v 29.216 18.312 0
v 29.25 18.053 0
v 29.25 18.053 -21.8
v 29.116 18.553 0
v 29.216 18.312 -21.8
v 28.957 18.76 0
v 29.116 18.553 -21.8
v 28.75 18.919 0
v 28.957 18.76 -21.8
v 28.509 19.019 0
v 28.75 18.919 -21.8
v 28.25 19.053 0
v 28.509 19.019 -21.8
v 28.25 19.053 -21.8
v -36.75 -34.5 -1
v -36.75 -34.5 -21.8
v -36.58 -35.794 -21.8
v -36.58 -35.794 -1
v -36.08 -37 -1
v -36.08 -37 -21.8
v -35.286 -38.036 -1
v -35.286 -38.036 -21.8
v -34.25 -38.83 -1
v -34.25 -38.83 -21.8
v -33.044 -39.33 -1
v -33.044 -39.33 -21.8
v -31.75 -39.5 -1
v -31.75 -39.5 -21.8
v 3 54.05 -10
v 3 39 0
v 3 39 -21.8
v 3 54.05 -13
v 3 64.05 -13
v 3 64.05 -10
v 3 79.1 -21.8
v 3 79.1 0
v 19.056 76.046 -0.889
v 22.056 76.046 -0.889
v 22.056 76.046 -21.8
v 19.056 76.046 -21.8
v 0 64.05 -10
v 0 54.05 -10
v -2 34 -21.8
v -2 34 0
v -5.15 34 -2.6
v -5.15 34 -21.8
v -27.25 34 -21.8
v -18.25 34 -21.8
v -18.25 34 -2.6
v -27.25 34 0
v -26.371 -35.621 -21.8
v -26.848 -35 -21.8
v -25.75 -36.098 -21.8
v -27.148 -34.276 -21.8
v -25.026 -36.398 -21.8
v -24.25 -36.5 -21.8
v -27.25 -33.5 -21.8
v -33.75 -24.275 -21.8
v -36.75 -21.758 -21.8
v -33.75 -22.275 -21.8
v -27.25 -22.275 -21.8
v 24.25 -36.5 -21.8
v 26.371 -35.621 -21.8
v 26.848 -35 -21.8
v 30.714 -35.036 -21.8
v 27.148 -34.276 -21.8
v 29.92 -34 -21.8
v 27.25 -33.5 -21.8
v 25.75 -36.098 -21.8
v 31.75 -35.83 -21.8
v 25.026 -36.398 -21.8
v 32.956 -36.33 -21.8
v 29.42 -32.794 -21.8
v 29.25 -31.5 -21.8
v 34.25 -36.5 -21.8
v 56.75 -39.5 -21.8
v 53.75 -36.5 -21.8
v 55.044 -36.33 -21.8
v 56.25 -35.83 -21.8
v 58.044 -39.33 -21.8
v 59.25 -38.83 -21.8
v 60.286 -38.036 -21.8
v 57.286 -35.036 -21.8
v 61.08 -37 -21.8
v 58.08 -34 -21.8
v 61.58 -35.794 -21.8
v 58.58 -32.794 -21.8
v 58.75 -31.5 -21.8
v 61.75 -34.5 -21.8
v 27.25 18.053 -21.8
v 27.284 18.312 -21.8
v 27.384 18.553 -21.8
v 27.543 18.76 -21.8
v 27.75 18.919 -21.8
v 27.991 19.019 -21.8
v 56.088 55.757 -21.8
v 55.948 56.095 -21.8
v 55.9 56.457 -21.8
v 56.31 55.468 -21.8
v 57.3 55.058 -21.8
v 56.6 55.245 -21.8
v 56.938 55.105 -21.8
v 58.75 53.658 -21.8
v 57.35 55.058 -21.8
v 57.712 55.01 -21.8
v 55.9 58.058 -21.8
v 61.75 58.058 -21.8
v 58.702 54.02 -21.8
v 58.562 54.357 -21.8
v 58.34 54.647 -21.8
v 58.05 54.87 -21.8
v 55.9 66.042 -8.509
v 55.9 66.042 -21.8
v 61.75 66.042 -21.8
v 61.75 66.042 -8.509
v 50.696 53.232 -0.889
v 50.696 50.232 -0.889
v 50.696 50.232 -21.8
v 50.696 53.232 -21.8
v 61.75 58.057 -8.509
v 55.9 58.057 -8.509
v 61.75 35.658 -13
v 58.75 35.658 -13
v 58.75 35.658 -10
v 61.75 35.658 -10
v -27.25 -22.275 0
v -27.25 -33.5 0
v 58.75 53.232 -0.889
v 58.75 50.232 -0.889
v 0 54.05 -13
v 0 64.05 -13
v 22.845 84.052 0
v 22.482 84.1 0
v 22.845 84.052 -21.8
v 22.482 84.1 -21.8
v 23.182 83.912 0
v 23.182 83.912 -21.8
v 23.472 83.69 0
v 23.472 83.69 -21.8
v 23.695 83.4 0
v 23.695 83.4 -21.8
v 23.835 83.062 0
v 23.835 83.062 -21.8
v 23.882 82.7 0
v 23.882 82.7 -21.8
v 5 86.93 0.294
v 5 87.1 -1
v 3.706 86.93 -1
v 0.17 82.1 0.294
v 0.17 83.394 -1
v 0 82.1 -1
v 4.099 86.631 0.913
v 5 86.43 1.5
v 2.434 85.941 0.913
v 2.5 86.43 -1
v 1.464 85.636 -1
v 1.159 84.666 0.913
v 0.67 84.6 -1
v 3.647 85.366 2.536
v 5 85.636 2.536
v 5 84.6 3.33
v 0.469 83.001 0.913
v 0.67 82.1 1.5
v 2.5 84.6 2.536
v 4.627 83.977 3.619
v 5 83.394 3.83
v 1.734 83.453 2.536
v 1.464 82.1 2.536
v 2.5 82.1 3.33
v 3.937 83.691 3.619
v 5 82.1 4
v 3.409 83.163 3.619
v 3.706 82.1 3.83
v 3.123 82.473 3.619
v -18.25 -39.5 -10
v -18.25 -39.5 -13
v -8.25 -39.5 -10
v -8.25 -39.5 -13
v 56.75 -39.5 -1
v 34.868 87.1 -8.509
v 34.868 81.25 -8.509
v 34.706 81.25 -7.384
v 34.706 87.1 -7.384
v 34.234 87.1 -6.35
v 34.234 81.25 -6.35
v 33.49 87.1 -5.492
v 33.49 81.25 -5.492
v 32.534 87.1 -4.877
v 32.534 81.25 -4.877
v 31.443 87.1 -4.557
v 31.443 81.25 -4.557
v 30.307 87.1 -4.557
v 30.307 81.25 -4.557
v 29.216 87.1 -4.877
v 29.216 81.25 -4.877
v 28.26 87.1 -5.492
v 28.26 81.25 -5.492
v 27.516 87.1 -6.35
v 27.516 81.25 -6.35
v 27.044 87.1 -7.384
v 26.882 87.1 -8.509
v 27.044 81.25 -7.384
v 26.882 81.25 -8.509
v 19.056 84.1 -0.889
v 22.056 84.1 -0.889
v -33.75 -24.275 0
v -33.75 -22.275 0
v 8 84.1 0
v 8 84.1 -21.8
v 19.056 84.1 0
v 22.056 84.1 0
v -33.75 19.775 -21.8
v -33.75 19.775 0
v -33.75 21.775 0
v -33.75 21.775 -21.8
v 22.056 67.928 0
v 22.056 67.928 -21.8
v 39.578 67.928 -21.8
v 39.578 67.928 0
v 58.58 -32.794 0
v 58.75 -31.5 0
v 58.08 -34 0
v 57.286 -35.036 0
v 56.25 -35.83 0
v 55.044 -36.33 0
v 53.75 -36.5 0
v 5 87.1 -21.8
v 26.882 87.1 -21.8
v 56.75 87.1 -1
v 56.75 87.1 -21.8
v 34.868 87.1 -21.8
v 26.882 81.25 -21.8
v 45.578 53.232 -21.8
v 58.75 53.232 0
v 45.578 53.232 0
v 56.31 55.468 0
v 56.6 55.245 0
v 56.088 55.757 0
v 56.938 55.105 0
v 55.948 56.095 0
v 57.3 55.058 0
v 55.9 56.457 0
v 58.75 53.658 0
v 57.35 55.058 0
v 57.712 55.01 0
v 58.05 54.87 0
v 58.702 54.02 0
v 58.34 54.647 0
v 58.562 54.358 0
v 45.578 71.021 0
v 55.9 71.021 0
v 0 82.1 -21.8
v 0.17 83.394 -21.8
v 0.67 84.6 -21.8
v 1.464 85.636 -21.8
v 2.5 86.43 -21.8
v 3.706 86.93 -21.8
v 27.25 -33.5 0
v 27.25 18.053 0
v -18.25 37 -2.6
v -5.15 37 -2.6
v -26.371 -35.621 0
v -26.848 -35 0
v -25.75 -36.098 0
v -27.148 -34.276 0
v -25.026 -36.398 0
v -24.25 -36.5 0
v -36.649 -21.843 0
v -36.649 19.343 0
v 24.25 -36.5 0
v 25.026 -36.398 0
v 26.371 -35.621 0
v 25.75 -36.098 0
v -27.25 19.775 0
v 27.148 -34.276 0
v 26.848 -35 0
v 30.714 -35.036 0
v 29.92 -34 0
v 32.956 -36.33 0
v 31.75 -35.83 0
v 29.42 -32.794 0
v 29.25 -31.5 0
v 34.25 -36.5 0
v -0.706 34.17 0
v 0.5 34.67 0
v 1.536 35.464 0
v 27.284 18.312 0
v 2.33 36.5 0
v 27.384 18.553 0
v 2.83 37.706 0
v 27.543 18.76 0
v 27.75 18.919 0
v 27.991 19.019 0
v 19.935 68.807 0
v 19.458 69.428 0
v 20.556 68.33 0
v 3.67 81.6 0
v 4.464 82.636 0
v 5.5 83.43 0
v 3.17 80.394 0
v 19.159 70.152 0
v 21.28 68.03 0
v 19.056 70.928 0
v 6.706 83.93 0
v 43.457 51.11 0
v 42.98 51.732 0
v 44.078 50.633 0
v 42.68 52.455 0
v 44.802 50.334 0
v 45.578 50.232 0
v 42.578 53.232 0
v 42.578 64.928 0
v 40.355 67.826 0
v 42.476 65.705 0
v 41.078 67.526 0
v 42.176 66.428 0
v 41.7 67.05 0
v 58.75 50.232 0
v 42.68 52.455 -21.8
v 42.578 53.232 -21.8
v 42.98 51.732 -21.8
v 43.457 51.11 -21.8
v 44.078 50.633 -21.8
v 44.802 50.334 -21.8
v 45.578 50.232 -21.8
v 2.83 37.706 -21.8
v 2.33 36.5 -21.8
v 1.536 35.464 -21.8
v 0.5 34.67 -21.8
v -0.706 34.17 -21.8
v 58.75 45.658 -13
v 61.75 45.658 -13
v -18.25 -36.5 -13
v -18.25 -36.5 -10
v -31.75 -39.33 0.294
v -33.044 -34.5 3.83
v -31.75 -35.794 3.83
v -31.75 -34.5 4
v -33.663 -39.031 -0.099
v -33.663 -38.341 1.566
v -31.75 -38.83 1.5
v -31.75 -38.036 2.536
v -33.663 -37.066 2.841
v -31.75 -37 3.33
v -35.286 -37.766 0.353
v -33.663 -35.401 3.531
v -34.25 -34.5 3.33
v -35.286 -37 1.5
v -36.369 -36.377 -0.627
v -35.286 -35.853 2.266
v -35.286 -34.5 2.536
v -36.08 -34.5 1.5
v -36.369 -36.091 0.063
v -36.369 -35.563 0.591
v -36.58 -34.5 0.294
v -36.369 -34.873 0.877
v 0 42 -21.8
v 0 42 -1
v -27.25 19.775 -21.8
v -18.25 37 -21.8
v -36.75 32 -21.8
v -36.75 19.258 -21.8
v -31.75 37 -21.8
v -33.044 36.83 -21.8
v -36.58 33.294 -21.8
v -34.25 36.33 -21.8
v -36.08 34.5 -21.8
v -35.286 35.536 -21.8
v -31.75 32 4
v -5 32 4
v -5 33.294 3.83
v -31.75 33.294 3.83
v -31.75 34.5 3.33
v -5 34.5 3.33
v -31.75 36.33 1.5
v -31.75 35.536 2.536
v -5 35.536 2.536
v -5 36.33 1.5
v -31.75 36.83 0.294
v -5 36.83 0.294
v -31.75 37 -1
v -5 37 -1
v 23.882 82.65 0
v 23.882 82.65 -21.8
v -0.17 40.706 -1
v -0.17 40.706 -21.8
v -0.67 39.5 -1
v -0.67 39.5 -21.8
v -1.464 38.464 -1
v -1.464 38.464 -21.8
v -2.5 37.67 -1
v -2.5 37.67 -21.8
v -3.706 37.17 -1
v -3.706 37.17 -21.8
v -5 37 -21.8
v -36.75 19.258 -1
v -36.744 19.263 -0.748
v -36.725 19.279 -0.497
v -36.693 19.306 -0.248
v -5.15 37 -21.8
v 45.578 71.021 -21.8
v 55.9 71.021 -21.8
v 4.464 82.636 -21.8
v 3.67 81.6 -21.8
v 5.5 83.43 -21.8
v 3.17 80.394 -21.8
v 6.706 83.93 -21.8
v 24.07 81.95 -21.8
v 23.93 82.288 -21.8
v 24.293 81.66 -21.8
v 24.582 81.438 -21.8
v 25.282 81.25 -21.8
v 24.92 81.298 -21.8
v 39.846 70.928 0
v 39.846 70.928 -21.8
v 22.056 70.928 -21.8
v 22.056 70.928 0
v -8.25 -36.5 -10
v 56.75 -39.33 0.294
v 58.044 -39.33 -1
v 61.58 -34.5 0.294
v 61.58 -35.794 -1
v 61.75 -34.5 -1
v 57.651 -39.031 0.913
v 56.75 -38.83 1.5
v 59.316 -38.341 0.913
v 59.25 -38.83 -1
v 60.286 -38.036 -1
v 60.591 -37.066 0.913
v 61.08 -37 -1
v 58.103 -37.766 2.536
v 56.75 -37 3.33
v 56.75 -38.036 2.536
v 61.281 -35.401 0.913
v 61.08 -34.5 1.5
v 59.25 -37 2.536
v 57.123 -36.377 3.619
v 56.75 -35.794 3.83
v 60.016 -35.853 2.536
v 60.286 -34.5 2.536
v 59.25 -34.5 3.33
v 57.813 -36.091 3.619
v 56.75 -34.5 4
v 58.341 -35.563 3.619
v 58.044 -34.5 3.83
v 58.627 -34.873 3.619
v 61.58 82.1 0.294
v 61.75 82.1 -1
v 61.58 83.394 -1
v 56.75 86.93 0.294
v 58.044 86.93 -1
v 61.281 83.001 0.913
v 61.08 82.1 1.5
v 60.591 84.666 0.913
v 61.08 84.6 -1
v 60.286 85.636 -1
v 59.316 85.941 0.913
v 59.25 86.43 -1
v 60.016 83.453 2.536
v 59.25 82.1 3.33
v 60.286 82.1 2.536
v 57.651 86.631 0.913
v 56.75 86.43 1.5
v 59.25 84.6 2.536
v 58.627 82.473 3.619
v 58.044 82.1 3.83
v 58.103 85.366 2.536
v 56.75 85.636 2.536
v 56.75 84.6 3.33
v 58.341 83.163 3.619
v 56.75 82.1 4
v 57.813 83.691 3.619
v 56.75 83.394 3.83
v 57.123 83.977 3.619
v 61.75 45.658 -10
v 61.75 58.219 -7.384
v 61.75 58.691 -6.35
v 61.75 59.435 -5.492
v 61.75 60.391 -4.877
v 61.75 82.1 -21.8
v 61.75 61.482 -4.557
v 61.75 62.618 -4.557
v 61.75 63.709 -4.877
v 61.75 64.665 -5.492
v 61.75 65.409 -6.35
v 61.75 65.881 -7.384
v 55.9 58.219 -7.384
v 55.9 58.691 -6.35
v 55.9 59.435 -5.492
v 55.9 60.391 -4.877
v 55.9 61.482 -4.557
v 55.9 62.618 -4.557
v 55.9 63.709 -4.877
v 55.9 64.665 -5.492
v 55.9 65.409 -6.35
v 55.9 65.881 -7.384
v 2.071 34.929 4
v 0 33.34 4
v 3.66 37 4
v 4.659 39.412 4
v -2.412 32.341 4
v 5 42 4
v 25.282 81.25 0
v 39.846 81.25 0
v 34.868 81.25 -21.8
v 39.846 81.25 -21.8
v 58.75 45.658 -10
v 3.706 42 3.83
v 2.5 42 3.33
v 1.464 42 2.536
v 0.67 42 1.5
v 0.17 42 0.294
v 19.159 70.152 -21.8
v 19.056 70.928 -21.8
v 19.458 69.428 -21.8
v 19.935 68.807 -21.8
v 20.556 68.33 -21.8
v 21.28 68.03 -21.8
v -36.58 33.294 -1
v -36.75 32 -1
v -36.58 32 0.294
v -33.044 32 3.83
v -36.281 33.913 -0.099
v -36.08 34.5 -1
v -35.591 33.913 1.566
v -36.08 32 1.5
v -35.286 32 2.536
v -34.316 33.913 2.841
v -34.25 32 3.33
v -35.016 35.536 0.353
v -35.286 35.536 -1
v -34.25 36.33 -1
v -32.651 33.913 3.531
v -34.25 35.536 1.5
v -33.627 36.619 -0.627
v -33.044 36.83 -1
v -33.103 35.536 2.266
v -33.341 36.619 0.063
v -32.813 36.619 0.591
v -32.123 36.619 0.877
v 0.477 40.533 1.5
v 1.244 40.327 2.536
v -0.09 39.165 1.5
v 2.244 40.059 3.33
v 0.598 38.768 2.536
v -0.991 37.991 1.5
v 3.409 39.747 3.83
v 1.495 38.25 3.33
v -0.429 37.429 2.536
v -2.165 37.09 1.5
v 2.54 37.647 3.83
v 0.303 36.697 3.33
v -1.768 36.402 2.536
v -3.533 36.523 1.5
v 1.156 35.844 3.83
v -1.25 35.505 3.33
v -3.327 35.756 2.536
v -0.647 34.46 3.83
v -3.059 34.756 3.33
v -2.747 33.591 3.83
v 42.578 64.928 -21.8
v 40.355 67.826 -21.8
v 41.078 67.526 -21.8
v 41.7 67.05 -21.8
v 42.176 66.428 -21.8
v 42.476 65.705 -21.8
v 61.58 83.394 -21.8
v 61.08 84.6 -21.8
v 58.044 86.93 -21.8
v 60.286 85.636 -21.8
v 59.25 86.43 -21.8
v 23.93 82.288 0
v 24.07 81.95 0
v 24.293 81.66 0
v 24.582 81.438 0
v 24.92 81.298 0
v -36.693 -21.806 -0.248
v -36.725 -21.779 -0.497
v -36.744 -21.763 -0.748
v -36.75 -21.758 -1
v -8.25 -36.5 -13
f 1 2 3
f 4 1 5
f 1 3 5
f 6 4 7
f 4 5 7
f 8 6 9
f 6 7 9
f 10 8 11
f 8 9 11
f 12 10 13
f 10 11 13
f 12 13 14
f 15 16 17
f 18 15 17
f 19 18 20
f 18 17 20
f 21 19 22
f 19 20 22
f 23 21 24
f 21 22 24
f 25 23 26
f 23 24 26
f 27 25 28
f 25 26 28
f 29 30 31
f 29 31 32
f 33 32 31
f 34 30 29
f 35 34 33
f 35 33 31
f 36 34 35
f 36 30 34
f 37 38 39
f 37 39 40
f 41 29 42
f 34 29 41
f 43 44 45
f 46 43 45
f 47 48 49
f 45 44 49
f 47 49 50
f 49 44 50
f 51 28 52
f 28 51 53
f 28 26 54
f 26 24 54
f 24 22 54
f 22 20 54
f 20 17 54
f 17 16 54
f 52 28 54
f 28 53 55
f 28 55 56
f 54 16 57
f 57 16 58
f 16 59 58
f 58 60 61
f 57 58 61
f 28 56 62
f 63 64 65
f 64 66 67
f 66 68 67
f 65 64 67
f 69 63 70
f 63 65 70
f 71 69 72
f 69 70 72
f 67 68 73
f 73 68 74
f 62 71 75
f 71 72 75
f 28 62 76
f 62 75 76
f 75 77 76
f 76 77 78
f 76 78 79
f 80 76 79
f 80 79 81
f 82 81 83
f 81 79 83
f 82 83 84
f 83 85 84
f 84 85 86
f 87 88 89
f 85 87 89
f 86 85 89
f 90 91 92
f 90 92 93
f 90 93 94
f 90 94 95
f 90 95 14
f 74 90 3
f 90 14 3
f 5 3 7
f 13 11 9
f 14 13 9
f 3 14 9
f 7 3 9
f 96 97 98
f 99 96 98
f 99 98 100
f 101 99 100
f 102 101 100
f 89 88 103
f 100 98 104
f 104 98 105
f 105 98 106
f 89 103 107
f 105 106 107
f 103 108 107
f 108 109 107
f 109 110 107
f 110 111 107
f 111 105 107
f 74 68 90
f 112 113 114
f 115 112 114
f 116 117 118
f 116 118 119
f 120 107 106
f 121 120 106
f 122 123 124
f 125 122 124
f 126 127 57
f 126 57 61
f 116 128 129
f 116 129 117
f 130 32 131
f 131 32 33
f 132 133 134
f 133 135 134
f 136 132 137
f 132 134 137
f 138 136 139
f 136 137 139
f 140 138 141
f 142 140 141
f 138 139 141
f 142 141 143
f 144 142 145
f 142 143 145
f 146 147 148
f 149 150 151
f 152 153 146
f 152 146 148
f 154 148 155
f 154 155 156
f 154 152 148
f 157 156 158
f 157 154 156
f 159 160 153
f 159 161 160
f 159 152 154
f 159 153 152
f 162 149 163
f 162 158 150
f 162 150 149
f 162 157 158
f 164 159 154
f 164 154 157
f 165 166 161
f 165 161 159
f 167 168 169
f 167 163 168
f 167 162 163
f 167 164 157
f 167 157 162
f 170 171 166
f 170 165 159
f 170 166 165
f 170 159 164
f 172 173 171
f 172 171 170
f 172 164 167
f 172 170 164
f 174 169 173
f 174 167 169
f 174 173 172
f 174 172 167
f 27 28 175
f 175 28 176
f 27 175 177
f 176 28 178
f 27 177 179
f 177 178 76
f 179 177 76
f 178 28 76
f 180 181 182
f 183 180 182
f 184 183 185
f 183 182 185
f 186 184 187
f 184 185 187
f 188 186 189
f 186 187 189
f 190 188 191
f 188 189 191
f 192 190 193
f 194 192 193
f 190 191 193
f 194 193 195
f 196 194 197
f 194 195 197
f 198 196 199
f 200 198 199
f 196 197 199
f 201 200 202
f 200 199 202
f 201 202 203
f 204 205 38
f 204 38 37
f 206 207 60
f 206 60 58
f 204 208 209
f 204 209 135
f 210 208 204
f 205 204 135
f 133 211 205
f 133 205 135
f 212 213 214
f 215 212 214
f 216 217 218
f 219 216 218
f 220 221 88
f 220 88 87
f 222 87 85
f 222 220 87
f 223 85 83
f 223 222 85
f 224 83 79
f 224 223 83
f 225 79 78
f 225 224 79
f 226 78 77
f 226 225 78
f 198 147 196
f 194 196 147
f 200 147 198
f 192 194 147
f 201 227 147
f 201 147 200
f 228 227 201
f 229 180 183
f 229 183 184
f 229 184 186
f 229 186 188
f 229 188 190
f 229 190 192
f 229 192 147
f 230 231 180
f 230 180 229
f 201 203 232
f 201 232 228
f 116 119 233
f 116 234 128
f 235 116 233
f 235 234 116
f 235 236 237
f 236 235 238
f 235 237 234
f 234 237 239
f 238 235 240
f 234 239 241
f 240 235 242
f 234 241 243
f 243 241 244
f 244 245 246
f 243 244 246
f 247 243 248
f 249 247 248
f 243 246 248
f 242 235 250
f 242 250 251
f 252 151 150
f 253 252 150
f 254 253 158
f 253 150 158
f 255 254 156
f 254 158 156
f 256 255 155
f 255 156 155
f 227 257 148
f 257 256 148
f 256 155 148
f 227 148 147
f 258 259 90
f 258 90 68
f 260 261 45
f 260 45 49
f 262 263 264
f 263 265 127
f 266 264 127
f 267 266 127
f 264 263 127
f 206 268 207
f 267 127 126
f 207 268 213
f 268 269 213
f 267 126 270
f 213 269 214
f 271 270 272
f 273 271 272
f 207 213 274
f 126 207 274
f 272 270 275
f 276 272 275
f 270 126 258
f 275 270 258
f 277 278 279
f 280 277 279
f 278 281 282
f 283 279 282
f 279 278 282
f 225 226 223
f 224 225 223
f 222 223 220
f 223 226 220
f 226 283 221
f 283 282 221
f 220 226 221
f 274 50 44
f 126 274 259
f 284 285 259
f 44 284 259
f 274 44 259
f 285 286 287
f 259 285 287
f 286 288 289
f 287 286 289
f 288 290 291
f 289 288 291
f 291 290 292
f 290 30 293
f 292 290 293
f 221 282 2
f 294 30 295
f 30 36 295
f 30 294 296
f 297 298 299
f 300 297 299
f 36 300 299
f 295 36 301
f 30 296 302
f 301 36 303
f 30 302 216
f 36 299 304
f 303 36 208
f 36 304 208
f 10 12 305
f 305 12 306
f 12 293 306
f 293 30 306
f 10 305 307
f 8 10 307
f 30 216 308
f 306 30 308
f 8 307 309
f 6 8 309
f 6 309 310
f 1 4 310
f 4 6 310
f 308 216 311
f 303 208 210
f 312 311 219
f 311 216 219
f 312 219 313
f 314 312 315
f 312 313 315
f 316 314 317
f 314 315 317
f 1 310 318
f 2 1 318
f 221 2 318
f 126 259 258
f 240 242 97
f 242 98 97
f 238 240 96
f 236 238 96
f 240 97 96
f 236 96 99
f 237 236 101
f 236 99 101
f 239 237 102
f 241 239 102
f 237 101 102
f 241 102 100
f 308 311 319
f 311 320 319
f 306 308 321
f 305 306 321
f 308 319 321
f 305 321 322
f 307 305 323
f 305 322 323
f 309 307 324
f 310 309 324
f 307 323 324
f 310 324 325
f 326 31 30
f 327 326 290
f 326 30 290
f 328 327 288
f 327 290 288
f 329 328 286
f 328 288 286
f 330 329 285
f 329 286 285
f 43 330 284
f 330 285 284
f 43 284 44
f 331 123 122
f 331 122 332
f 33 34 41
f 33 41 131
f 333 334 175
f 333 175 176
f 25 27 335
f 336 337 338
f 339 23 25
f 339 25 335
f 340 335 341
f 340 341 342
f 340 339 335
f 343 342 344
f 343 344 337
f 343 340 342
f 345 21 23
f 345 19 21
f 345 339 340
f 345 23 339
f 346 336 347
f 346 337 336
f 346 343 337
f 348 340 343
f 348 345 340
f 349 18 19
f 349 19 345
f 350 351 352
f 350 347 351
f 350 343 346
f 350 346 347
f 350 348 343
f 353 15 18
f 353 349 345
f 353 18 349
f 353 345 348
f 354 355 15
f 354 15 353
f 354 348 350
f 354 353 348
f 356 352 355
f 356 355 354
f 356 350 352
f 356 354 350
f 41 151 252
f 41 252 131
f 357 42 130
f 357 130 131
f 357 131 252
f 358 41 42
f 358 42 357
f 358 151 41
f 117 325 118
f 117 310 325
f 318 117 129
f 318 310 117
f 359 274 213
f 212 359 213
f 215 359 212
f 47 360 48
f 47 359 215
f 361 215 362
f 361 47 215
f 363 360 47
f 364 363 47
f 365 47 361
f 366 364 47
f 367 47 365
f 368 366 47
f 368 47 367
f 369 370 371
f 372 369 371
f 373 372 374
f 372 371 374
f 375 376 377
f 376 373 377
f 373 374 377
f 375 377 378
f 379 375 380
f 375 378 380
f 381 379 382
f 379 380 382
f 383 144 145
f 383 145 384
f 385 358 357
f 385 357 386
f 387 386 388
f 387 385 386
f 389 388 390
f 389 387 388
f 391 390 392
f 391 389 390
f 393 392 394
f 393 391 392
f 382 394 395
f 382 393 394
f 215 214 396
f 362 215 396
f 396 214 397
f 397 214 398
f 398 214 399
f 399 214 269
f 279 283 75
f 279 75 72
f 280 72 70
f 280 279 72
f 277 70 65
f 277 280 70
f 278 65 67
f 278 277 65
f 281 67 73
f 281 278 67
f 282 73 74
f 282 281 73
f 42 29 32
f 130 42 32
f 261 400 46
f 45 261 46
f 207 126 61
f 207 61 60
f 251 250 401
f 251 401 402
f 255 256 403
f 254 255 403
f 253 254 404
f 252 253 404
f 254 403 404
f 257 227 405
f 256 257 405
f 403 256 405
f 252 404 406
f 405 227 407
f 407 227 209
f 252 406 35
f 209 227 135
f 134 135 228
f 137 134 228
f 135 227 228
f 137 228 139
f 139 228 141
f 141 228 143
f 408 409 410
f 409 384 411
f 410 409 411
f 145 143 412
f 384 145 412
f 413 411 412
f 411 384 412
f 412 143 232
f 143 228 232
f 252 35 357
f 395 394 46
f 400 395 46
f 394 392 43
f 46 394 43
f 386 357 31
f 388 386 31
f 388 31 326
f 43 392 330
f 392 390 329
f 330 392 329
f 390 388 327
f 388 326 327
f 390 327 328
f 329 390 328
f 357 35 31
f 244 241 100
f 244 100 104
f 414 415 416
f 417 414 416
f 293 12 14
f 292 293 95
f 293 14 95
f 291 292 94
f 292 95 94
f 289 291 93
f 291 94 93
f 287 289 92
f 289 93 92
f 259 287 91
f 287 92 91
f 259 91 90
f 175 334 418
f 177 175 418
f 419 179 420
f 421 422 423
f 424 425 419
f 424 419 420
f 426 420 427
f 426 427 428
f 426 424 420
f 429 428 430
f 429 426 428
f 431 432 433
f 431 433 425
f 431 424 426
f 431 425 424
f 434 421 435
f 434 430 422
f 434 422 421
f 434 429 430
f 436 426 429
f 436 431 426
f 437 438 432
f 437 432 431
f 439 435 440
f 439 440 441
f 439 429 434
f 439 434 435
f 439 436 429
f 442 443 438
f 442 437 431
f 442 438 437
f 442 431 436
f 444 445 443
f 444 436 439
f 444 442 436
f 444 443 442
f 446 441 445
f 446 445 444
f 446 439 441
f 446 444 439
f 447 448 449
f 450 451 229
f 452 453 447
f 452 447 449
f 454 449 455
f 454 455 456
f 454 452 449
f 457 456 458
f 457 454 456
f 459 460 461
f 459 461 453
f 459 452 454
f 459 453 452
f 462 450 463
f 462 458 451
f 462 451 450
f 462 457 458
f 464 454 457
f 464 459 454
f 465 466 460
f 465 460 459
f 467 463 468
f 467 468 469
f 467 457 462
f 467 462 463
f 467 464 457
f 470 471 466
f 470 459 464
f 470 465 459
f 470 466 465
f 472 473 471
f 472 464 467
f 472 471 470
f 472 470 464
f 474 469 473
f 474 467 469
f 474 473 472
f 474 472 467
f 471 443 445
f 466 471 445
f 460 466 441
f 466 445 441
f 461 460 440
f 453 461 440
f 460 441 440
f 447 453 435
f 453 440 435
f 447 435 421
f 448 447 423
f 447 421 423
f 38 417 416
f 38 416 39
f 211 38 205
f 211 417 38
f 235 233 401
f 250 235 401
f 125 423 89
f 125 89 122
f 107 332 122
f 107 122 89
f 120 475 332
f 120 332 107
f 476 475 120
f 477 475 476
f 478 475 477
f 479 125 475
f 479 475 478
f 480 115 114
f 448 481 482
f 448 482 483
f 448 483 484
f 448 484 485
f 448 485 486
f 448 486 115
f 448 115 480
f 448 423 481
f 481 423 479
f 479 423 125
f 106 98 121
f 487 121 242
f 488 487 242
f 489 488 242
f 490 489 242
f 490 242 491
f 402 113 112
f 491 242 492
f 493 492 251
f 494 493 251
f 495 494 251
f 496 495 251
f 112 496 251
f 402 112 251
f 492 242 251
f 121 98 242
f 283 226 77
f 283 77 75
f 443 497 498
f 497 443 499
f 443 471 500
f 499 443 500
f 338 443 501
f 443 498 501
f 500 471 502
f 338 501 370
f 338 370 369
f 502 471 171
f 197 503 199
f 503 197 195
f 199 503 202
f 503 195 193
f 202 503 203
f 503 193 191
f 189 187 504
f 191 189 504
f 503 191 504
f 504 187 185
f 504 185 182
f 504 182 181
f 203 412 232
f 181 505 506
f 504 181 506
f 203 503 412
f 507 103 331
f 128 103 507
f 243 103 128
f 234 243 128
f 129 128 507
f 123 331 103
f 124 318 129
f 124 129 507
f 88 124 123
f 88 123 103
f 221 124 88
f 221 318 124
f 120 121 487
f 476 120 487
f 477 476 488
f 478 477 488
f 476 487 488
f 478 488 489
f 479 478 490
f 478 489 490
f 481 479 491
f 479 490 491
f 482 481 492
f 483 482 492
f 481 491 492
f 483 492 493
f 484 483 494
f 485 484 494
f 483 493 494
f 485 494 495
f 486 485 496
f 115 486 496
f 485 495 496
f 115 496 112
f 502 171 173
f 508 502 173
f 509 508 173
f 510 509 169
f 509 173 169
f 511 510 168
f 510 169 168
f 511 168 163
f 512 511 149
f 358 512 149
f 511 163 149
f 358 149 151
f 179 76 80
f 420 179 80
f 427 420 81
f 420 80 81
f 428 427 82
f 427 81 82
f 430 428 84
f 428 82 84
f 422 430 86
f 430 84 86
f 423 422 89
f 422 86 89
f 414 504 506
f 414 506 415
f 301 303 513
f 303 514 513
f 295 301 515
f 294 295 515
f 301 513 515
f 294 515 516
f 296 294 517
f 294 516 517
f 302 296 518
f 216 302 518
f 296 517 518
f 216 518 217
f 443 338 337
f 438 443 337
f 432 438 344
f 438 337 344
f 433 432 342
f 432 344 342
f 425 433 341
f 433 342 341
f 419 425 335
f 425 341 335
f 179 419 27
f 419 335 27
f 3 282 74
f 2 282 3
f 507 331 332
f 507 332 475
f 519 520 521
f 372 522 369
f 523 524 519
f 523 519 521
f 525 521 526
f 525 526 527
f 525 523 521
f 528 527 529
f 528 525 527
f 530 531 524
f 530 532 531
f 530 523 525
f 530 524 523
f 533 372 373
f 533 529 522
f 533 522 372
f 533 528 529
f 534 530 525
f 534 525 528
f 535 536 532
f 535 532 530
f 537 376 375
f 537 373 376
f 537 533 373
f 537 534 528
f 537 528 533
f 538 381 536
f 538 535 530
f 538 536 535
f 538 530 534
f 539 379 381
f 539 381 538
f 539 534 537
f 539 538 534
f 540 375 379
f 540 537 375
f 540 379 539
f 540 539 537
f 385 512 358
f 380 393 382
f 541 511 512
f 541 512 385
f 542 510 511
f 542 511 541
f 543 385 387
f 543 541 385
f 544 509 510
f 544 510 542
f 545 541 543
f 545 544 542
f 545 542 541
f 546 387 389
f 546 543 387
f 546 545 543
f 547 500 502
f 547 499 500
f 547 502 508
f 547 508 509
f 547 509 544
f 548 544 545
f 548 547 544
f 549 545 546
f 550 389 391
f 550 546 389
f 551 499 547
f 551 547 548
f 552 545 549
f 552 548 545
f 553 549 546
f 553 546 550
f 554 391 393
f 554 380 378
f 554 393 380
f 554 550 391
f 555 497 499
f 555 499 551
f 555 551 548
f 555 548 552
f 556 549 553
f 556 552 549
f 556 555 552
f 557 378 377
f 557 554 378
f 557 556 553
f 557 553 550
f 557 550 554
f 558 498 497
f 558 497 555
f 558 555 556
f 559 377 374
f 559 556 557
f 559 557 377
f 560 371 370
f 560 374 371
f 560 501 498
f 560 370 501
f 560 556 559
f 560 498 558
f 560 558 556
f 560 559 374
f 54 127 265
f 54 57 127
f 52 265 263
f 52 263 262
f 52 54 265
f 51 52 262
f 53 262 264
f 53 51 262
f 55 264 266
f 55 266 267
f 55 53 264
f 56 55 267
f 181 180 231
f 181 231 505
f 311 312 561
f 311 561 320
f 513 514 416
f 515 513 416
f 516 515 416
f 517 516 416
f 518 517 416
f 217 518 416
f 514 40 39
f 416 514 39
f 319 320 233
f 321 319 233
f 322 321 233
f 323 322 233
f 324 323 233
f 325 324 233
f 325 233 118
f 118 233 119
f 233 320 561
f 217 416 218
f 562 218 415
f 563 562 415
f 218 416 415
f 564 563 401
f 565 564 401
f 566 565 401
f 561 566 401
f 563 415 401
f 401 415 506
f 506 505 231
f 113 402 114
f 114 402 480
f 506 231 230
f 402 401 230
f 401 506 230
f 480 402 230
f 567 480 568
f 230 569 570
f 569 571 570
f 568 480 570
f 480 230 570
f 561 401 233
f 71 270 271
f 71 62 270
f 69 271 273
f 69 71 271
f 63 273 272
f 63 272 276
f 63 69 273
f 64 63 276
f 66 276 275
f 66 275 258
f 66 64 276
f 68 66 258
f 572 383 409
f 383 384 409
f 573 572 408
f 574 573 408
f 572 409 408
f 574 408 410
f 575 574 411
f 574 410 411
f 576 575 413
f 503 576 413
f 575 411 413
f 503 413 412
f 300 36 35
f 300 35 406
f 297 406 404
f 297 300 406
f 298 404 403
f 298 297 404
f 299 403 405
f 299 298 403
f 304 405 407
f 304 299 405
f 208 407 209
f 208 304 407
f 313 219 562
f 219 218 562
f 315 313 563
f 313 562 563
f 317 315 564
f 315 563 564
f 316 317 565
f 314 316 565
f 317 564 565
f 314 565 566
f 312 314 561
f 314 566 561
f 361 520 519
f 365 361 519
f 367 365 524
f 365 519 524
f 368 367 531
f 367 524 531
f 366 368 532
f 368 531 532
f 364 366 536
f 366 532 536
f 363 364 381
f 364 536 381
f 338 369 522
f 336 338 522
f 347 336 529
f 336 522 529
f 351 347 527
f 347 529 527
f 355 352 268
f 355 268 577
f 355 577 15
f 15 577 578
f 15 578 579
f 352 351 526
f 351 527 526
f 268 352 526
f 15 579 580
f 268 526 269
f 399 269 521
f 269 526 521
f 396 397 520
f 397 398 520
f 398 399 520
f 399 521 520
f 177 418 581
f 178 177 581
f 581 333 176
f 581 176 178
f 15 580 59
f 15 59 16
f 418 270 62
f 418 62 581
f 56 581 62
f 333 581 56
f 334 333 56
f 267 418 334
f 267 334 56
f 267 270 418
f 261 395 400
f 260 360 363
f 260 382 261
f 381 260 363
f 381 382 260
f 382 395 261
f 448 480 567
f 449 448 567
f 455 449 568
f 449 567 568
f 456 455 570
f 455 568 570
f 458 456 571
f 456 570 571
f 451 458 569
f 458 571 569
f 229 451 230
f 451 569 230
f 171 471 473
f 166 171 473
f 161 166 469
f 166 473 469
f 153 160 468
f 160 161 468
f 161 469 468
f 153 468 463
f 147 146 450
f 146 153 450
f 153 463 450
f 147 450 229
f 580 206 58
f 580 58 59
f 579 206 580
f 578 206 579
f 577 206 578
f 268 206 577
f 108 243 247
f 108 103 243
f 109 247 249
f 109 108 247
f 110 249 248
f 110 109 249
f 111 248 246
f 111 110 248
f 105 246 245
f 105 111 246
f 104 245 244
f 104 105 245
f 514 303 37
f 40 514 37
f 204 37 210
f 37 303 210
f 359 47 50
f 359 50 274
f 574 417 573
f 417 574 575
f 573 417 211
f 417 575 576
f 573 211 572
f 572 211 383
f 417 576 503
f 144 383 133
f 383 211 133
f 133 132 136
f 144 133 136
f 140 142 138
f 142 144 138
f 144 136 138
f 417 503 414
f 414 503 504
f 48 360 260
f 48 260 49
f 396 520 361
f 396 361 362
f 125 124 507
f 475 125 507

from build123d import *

# Parameters (mm, degrees)
BOSS_EXTRUDE1_DEPTH = 4
BOSS_EXTRUDE2_DEPTH = 21.8
BOSS_EXTRUDE3_START = 55.9
BOSS_EXTRUDE3_DEPTH = 5.85
BOSS_EXTRUDE4_START = 81.25
BOSS_EXTRUDE4_DEPTH = 5.85
SKETCH5_W           = 13.1
SKETCH5_H           = 3
BOSS_EXTRUDE5_DEPTH = 2.6
FILLET1_R           = 5
FILLET2_R           = 3
SKETCH6_W           = 3
SKETCH6_H           = 8.0544
SKETCH6_W_2         = 8.0544
SKETCH6_H_2         = 3
BOSS_EXTRUDE6_DEPTH = 0.889
FILLET3_R           = 3
FILLET4_R           = 1.4
FILLET5_R           = 1
SKETCH8_W           = 3
SKETCH8_H           = 10
CUT_EXTRUDE1_DEPTH  = 3
SKETCH9_W           = 3
SKETCH9_H           = 10
CUT_EXTRUDE2_DEPTH  = 3
SKETCH10_W          = 10
SKETCH10_H          = 3
CUT_EXTRUDE3_DEPTH  = 3


# Read off the part's stored shape, not the designer's step: Boss-Extrude3, Boss-Extrude4
# Some blends are built 0.0001 mm under size
with BuildPart() as part:
    # Sketch1 → Boss-Extrude1 (new body)
    with BuildSketch(Plane.XY):
        Polygon((-36.75, 37), (-36.75, -39.5), (61.75, -39.5), (61.75, 87.1), (0, 87.1), (0, 37), align=None)
    extrude(amount=BOSS_EXTRUDE1_DEPTH)

    # Sketch2 → Boss-Extrude2 (add)
    with BuildSketch(Plane(origin=(0, 0, 0), x_dir=(-1, 0, 0), z_dir=(0, 0, -1))):
        Polygon((5.15, 34), (-3, 34), (-3, 84.1), (-23.8825, 84.1), (-23.8825, 81.25), (-26.8825, 81.25), (-26.8825, 87.1), (0, 87.1), (0, 37), (5.15, 37), align=None)
        Polygon((-34.8675, 87.1), (-34.8675, 81.25), (-39.8459, 81.25), (-39.8459, 70.9282), (-22.0565, 70.9282), (-22.0565, 76.0456), (-19.0565, 76.0456), (-19.0565, 67.9282), (-42.5782, 67.9282), (-42.5782, 50.2315), (-50.6956, 50.2315), (-50.6956, 53.2315), (-45.5782, 53.2315), (-45.5782, 71.0209), (-55.9, 71.0209), (-55.9, 66.0425), (-61.75, 66.0425), (-61.75, 87.1), align=None)
        Polygon((-61.75, 58.0575), (-55.9, 58.0575), (-55.9, 55.0575), (-58.75, 55.0575), (-58.75, -36.5), (-29.25, -36.5), (-29.25, 19.052930988), (-27.25, 19.052930988), (-27.25, -36.5), (27.25, -36.5), (27.25, -22.2751), (33.75, -22.2751), (33.75, -24.2751), (36.75, -21.757801106), (36.75, -39.5), (-61.75, -39.5), align=None)
        Polygon((18.25, 37), (18.25, 34), (27.25, 34), (27.25, 19.7751), (33.75, 19.7751), (33.75, 21.7751), (36.75, 19.257801106), (36.75, 37), align=None)
    extrude(amount=BOSS_EXTRUDE2_DEPTH)

    # Boss-Extrude3 outline → Boss-Extrude3 (add)
    with BuildSketch(Plane.YZ.offset(BOSS_EXTRUDE3_START)):
        with BuildLine():
            Line((58.0575, 0), (58.0575, -8.509))
            ThreePointArc((58.0575, -8.509), (62.05, -4.5165), (66.0425, -8.509))
            Line((66.0425, -8.509), (66.0425, 0))
            Line((66.0425, 0), (58.0575, 0))
        make_face()
    extrude(amount=BOSS_EXTRUDE3_DEPTH)

    # Boss-Extrude4 outline → Boss-Extrude4 (add)
    with BuildSketch(Plane(origin=(0, 0, 0), x_dir=(1, 0, 0), z_dir=(0, 1, 0)).offset(BOSS_EXTRUDE4_START)):
        with BuildLine():
            Line((34.8675, 0), (34.8675, 8.509))
            ThreePointArc((34.8675, 8.509), (30.875, 4.5165), (26.8825, 8.509))
            Line((26.8825, 8.509), (26.8825, 0))
            Line((26.8825, 0), (34.8675, 0))
        make_face()
    extrude(amount=BOSS_EXTRUDE4_DEPTH)

    # Sketch5 → Boss-Extrude5 (add)
    with BuildSketch(Plane(origin=(0, 0, 0), x_dir=(-1, 0, 0), z_dir=(0, 0, -1))):
        with Locations((11.7, 35.5)):
            Rectangle(SKETCH5_W, SKETCH5_H)
    extrude(amount=BOSS_EXTRUDE5_DEPTH)

    # Fillet1
    # the kernel refuses this fillet: 5 mm, written as the material it adds along each edge
    with BuildSketch(Plane(origin=(0, 37, 4), x_dir=(0, 1, 0), z_dir=(0, 0, -1))) as fillet1_piece_1:
        with BuildLine():
            CenterArc((FILLET1_R, -FILLET1_R), FILLET1_R, 90, 90)
            Line((0, -FILLET1_R), (0, 0))
            Line((0, 0), (FILLET1_R, 0))
        make_face()
    extrude(amount=25.8)
    with BuildSketch(Plane(origin=(29.25, -36.5, 12.5), x_dir=(1, 0, 0), z_dir=(0, 0, -1))) as fillet1_piece_2_section:
        with BuildLine():
            CenterArc((FILLET1_R, -FILLET1_R), FILLET1_R, 90, 90)
            Line((0, -FILLET1_R), (0, 0))
            Line((0, 0), (FILLET1_R, 0))
        make_face()
    fillet1_piece_2 = extrude(amount=34.3, mode=Mode.PRIVATE)
    fillet1_piece_2 = split(fillet1_piece_2, bisect_by=Plane(origin=(30.366839695, -35.383160305, 4), z_dir=(0, 0, -1)), keep=Keep.TOP, mode=Mode.PRIVATE)
    add(fillet1_piece_2)
    with BuildSketch(Plane(origin=(58.75, -36.5, 12.5), x_dir=(0, 1, 0), z_dir=(0, 0, -1))) as fillet1_piece_3_section:
        with BuildLine():
            CenterArc((FILLET1_R, -FILLET1_R), FILLET1_R, 90, 90)
            Line((0, -FILLET1_R), (0, 0))
            Line((0, 0), (FILLET1_R, 0))
        make_face()
    fillet1_piece_3 = extrude(amount=34.3, mode=Mode.PRIVATE)
    fillet1_piece_3 = split(fillet1_piece_3, bisect_by=Plane(origin=(57.633160305, -35.383160305, 4), z_dir=(0, 0, -1)), keep=Keep.TOP, mode=Mode.PRIVATE)
    add(fillet1_piece_3)
    with BuildSketch(Plane(origin=(3, 84.1, 12.5), x_dir=(1, 0, 0), z_dir=(0, 0, -1))) as fillet1_piece_4_section:
        with BuildLine():
            CenterArc((FILLET1_R, FILLET1_R), FILLET1_R, 180, 90)
            Line((0, FILLET1_R), (0, 0))
            Line((0, 0), (FILLET1_R, 0))
        make_face()
    fillet1_piece_4 = extrude(amount=34.3, mode=Mode.PRIVATE)
    fillet1_piece_4 = split(fillet1_piece_4, bisect_by=Plane(origin=(4.116839695, 82.983160305, 4), z_dir=(0, 0, -1)), keep=Keep.TOP, mode=Mode.PRIVATE)
    add(fillet1_piece_4)
    # the kernel refuses this fillet: 5 mm, written as the material it takes off along each edge
    with BuildSketch(Plane(origin=(56.75, 82.1, -1), x_dir=(1, 0, 0), z_dir=(0, 0, 1))) as fillet1_2_piece_1_section:
        Polygon((0, 0), (FILLET1_R * 1.02, 0), (FILLET1_R * 1.02, FILLET1_R * 1.02), (0, FILLET1_R * 1.02), align=None)
    fillet1_2_piece_1 = extrude(amount=FILLET1_R * 1.02, mode=Mode.PRIVATE)
    fillet1_2_piece_1 = fillet1_2_piece_1 - Plane(origin=(56.75, 82.1, -1), x_dir=(-0.7071067811865475, -0.7071067811865477, 0), z_dir=(0, 0, 1)) * Sphere(FILLET1_R, mode=Mode.PRIVATE)
    add(fillet1_2_piece_1, mode=Mode.SUBTRACT)
    with BuildSketch(Plane(origin=(56.75, -34.5, -1), x_dir=(0, -1, 0), z_dir=(0, 0, 1))) as fillet1_2_piece_2_section:
        Polygon((0, 0), (FILLET1_R * 1.02, 0), (FILLET1_R * 1.02, FILLET1_R * 1.02), (0, FILLET1_R * 1.02), align=None)
    fillet1_2_piece_2 = extrude(amount=FILLET1_R * 1.02, mode=Mode.PRIVATE)
    fillet1_2_piece_2 = fillet1_2_piece_2 - Plane(origin=(56.75, -34.5, -1), x_dir=(-0.7071067811865476, 0.7071067811865475, 0), z_dir=(0, 0, 1)) * Sphere(FILLET1_R, mode=Mode.PRIVATE)
    add(fillet1_2_piece_2, mode=Mode.SUBTRACT)
    with BuildSketch(Plane(origin=(-31.75, -34.5, -1), x_dir=(0, 0, 1), z_dir=(-1, 0, 0))) as fillet1_2_piece_3_section:
        Polygon((0, 0), (FILLET1_R * 1.02, 0), (FILLET1_R * 1.02, -FILLET1_R * 1.02), (0, -FILLET1_R * 1.02), align=None)
    fillet1_2_piece_3 = extrude(amount=FILLET1_R * 1.02, mode=Mode.PRIVATE)
    fillet1_2_piece_3 = fillet1_2_piece_3 - Plane(origin=(-31.75, -34.5, -1), x_dir=(0, 0.7071067811865475, -0.7071067811865475), z_dir=(-1, 0, 0)) * Sphere(FILLET1_R, mode=Mode.PRIVATE)
    add(fillet1_2_piece_3, mode=Mode.SUBTRACT)
    with BuildSketch(Plane(origin=(56.75, 87.1, 4), x_dir=(0, -1, 0), z_dir=(-1, 0, 0))) as fillet1_2_piece_4:
        with BuildLine():
            CenterArc((FILLET1_R, -FILLET1_R), FILLET1_R, 90, 90)
            Line((0, -FILLET1_R), (0, 0))
            Line((0, 0), (FILLET1_R, 0))
        make_face()
    extrude(amount=69.25, mode=Mode.SUBTRACT)
    with BuildSketch(Plane(origin=(61.75, -34.5, 4), x_dir=(-1, 0, 0), z_dir=(0, 1, 0))) as fillet1_2_piece_5:
        with BuildLine():
            CenterArc((FILLET1_R, -FILLET1_R), FILLET1_R, 90, 90)
            Line((0, -FILLET1_R), (0, 0))
            Line((0, 0), (FILLET1_R, 0))
        make_face()
    extrude(amount=116.6, mode=Mode.SUBTRACT)
    with BuildSketch(Plane(origin=(-31.75, -39.5, 4), x_dir=(0, 1, 0), z_dir=(1, 0, 0))) as fillet1_2_piece_6:
        with BuildLine():
            CenterArc((FILLET1_R, -FILLET1_R), FILLET1_R, 90, 90)
            Line((0, -FILLET1_R), (0, 0))
            Line((0, 0), (FILLET1_R, 0))
        make_face()
    extrude(amount=88.5, mode=Mode.SUBTRACT)
    with BuildSketch(Plane(origin=(-36.75, 49.5, 4), x_dir=(0, 0, -1), z_dir=(0, -1, 0))) as fillet1_2_piece_7:
        with BuildLine():
            CenterArc((FILLET1_R, FILLET1_R), FILLET1_R, 180, 90)
            Line((0, FILLET1_R), (0, 0))
            Line((0, 0), (FILLET1_R, 0))
        make_face()
    extrude(amount=84, mode=Mode.SUBTRACT)
    with BuildSketch(Plane(origin=(-36.75, -39.5, -34.3), x_dir=(0, 1, 0), z_dir=(0, 0, 1)), Plane(origin=(61.75, 87.1, -34.3), x_dir=(0, -1, 0), z_dir=(0, 0, 1)), Plane(origin=(61.75, -39.5, -34.3), x_dir=(-1, 0, 0), z_dir=(0, 0, 1))) as fillet1_2_piece_8:
        with BuildLine():
            CenterArc((FILLET1_R, -FILLET1_R), FILLET1_R, 90, 90)
            Line((0, -FILLET1_R), (0, 0))
            Line((0, 0), (FILLET1_R, 0))
        make_face()
    extrude(amount=33.3, mode=Mode.SUBTRACT)
    with BuildSketch(Plane(origin=(-36.75, 37, 16.5), x_dir=(0, -1, 0), z_dir=(0, 0, -1))) as fillet1_2_piece_9:
        with BuildLine():
            CenterArc((FILLET1_R, -FILLET1_R), FILLET1_R, 90, 90)
            Line((0, -FILLET1_R), (0, 0))
            Line((0, 0), (FILLET1_R, 0))
        make_face()
    extrude(amount=50.8, mode=Mode.SUBTRACT)
    with BuildSketch(Plane(origin=(0, 87.1, 16.5), x_dir=(1, 0, 0), z_dir=(0, 0, -1))) as fillet1_2_piece_10:
        with BuildLine():
            CenterArc((FILLET1_R, FILLET1_R), FILLET1_R, 180, 90)
            Line((0, FILLET1_R), (0, 0))
            Line((0, 0), (FILLET1_R, 0))
        make_face()
    extrude(amount=50.8, mode=Mode.SUBTRACT)
    with BuildSketch(Plane(origin=(3, 34, 0), x_dir=(-1, 0, 0), z_dir=(0, 0, -1))) as fillet1_2_piece_11:
        with BuildLine():
            CenterArc((FILLET1_R, FILLET1_R), FILLET1_R, 180, 90)
            Line((0, FILLET1_R), (0, 0))
            Line((0, 0), (FILLET1_R, 0))
        make_face()
    extrude(amount=34.3, mode=Mode.SUBTRACT)
    # the kernel refuses this fillet: 5 mm, written as the material it takes off along each edge
    with BuildSketch(Plane(origin=(-31.75, 32, -1), x_dir=(0, 0, 1), z_dir=(0, 1, 0))) as fillet1_3_piece_1_section:
        Polygon((0, 0), (FILLET1_R * 1.02, 0), (FILLET1_R * 1.02, -FILLET1_R * 1.02), (0, -FILLET1_R * 1.02), align=None)
    fillet1_3_piece_1 = extrude(amount=FILLET1_R * 1.02, mode=Mode.PRIVATE)
    fillet1_3_piece_1 = fillet1_3_piece_1 - Plane(origin=(-31.75, 32, -1), x_dir=(0.7071067811865475, 0, -0.7071067811865475), z_dir=(0, 1, 0)) * Sphere(FILLET1_R, mode=Mode.PRIVATE)
    add(fillet1_3_piece_1, mode=Mode.SUBTRACT)
    with BuildSketch(Plane(origin=(5, 82.1, -1), x_dir=(-1, 0, 0), z_dir=(0, 0, 1))) as fillet1_3_piece_2_section:
        Polygon((0, 0), (FILLET1_R * 1.02, 0), (FILLET1_R * 1.02, -FILLET1_R * 1.02), (0, -FILLET1_R * 1.02), align=None)
    fillet1_3_piece_2 = extrude(amount=FILLET1_R * 1.02, mode=Mode.PRIVATE)
    fillet1_3_piece_2 = fillet1_3_piece_2 - Plane(origin=(5, 82.1, -1), x_dir=(0.7071067811865475, -0.7071067811865475, 0), z_dir=(0, 0, 1)) * Sphere(FILLET1_R, mode=Mode.PRIVATE)
    add(fillet1_3_piece_2, mode=Mode.SUBTRACT)
    with BuildSketch(Plane(origin=(0, 82.1, 4), x_dir=(1, 0, 0), z_dir=(0, -1, 0))) as fillet1_3_piece_3:
        with BuildLine():
            CenterArc((FILLET1_R, -FILLET1_R), FILLET1_R, 90, 90)
            Line((0, -FILLET1_R), (0, 0))
            Line((0, 0), (FILLET1_R, 0))
        make_face()
    extrude(amount=40.1, mode=Mode.SUBTRACT)
    with BuildSketch(Plane(origin=(-5, 37, 4), x_dir=(0, 0, -1), z_dir=(-1, 0, 0))) as fillet1_3_piece_4:
        with BuildLine():
            CenterArc((FILLET1_R, FILLET1_R), FILLET1_R, 180, 90)
            Line((0, FILLET1_R), (0, 0))
            Line((0, 0), (FILLET1_R, 0))
        make_face()
    extrude(amount=26.75, mode=Mode.SUBTRACT)
    with BuildSketch(Plane(origin=(-5, 42, 4), x_dir=(1, 0, 0), z_dir=(0, 1, 0))) as fillet1_3_piece_5:
        with BuildLine():
            CenterArc((5 + FILLET1_R, FILLET1_R), FILLET1_R, 180, 90)
            Line((5, FILLET1_R), (5, 0))
            Line((5, 0), (5 + FILLET1_R, 0))
        make_face()
    revolve(axis=Axis((-5, 42, 4), (0, 0, -1)), revolution_arc=90, mode=Mode.SUBTRACT)

    # Fillet2
    fillet2_edges = [part.edges().sort_by_distance(p)[0] for p in [
        (27.25, -36.5, -10.9),
        (-27.25, -36.5, -10.9),
    ]]
    fillet(fillet2_edges, radius=FILLET2_R)

    # Sketch6 → Boss-Extrude6 (add)
    with BuildSketch(Plane(origin=(0, 0, 0), x_dir=(-1, 0, 0), z_dir=(0, 0, -1))):
        with Locations((-20.5565, 80.0728)):
            Rectangle(SKETCH6_W, SKETCH6_H)
        with Locations((-54.7228, 51.7315)):
            Rectangle(SKETCH6_W_2, SKETCH6_H_2)
    extrude(amount=BOSS_EXTRUDE6_DEPTH)

    # Fillet3
    fillet3_edges = [part.edges().sort_by_distance(p)[0] for p in [
        (19.0565, 67.9282, -10.9),
        (42.5782, 67.9282, -10.9),
        (42.5782, 50.2315, -10.9),
    ]]
    fillet(fillet3_edges, radius=FILLET3_R)

    # Fillet4
    fillet4_edges = [part.edges().sort_by_distance(p)[0] for p in [
        (23.8825, 84.1, -10.9),
        (23.8825, 81.25, -10.9),
        (55.9, 55.0575, -10.9),
        (58.75, 55.0575, -10.9),
    ]]
    fillet(fillet4_edges, radius=FILLET4_R)

    # Fillet5
    fillet5_edges = [part.edges().sort_by_distance(p)[0] for p in [
        (29.25, 19.052930988, -10.9),
        (27.25, 19.052930988, -10.9),
    ]]
    fillet(fillet5_edges, radius=FILLET5_R - 0.0001)  # a hair under: the kernel refuses the full size

    # Sketch8 → Cut-Extrude1 (cut)
    with BuildSketch(Plane.ZY.offset(-58.75)):
        with Locations((-11.5, 40.6575)):
            Rectangle(SKETCH8_W, SKETCH8_H)
    extrude(amount=-CUT_EXTRUDE1_DEPTH, mode=Mode.SUBTRACT)

    # Sketch9 → Cut-Extrude2 (cut)
    with BuildSketch(Plane(origin=(3, 0, 0), x_dir=(0, 0, -1), z_dir=(1, 0, 0))):
        with Locations((11.5, 59.05)):
            Rectangle(SKETCH9_W, SKETCH9_H)
    extrude(amount=-CUT_EXTRUDE2_DEPTH, mode=Mode.SUBTRACT)

    # Sketch10 → Cut-Extrude3 (cut)
    with BuildSketch(Plane(origin=(0, -36.5, 0), x_dir=(1, 0, 0), z_dir=(0, 1, 0))):
        with Locations((-13.25, 11.5)):
            Rectangle(SKETCH10_W, SKETCH10_H)
    extrude(amount=-CUT_EXTRUDE3_DEPTH, mode=Mode.SUBTRACT)


solid = part.part
